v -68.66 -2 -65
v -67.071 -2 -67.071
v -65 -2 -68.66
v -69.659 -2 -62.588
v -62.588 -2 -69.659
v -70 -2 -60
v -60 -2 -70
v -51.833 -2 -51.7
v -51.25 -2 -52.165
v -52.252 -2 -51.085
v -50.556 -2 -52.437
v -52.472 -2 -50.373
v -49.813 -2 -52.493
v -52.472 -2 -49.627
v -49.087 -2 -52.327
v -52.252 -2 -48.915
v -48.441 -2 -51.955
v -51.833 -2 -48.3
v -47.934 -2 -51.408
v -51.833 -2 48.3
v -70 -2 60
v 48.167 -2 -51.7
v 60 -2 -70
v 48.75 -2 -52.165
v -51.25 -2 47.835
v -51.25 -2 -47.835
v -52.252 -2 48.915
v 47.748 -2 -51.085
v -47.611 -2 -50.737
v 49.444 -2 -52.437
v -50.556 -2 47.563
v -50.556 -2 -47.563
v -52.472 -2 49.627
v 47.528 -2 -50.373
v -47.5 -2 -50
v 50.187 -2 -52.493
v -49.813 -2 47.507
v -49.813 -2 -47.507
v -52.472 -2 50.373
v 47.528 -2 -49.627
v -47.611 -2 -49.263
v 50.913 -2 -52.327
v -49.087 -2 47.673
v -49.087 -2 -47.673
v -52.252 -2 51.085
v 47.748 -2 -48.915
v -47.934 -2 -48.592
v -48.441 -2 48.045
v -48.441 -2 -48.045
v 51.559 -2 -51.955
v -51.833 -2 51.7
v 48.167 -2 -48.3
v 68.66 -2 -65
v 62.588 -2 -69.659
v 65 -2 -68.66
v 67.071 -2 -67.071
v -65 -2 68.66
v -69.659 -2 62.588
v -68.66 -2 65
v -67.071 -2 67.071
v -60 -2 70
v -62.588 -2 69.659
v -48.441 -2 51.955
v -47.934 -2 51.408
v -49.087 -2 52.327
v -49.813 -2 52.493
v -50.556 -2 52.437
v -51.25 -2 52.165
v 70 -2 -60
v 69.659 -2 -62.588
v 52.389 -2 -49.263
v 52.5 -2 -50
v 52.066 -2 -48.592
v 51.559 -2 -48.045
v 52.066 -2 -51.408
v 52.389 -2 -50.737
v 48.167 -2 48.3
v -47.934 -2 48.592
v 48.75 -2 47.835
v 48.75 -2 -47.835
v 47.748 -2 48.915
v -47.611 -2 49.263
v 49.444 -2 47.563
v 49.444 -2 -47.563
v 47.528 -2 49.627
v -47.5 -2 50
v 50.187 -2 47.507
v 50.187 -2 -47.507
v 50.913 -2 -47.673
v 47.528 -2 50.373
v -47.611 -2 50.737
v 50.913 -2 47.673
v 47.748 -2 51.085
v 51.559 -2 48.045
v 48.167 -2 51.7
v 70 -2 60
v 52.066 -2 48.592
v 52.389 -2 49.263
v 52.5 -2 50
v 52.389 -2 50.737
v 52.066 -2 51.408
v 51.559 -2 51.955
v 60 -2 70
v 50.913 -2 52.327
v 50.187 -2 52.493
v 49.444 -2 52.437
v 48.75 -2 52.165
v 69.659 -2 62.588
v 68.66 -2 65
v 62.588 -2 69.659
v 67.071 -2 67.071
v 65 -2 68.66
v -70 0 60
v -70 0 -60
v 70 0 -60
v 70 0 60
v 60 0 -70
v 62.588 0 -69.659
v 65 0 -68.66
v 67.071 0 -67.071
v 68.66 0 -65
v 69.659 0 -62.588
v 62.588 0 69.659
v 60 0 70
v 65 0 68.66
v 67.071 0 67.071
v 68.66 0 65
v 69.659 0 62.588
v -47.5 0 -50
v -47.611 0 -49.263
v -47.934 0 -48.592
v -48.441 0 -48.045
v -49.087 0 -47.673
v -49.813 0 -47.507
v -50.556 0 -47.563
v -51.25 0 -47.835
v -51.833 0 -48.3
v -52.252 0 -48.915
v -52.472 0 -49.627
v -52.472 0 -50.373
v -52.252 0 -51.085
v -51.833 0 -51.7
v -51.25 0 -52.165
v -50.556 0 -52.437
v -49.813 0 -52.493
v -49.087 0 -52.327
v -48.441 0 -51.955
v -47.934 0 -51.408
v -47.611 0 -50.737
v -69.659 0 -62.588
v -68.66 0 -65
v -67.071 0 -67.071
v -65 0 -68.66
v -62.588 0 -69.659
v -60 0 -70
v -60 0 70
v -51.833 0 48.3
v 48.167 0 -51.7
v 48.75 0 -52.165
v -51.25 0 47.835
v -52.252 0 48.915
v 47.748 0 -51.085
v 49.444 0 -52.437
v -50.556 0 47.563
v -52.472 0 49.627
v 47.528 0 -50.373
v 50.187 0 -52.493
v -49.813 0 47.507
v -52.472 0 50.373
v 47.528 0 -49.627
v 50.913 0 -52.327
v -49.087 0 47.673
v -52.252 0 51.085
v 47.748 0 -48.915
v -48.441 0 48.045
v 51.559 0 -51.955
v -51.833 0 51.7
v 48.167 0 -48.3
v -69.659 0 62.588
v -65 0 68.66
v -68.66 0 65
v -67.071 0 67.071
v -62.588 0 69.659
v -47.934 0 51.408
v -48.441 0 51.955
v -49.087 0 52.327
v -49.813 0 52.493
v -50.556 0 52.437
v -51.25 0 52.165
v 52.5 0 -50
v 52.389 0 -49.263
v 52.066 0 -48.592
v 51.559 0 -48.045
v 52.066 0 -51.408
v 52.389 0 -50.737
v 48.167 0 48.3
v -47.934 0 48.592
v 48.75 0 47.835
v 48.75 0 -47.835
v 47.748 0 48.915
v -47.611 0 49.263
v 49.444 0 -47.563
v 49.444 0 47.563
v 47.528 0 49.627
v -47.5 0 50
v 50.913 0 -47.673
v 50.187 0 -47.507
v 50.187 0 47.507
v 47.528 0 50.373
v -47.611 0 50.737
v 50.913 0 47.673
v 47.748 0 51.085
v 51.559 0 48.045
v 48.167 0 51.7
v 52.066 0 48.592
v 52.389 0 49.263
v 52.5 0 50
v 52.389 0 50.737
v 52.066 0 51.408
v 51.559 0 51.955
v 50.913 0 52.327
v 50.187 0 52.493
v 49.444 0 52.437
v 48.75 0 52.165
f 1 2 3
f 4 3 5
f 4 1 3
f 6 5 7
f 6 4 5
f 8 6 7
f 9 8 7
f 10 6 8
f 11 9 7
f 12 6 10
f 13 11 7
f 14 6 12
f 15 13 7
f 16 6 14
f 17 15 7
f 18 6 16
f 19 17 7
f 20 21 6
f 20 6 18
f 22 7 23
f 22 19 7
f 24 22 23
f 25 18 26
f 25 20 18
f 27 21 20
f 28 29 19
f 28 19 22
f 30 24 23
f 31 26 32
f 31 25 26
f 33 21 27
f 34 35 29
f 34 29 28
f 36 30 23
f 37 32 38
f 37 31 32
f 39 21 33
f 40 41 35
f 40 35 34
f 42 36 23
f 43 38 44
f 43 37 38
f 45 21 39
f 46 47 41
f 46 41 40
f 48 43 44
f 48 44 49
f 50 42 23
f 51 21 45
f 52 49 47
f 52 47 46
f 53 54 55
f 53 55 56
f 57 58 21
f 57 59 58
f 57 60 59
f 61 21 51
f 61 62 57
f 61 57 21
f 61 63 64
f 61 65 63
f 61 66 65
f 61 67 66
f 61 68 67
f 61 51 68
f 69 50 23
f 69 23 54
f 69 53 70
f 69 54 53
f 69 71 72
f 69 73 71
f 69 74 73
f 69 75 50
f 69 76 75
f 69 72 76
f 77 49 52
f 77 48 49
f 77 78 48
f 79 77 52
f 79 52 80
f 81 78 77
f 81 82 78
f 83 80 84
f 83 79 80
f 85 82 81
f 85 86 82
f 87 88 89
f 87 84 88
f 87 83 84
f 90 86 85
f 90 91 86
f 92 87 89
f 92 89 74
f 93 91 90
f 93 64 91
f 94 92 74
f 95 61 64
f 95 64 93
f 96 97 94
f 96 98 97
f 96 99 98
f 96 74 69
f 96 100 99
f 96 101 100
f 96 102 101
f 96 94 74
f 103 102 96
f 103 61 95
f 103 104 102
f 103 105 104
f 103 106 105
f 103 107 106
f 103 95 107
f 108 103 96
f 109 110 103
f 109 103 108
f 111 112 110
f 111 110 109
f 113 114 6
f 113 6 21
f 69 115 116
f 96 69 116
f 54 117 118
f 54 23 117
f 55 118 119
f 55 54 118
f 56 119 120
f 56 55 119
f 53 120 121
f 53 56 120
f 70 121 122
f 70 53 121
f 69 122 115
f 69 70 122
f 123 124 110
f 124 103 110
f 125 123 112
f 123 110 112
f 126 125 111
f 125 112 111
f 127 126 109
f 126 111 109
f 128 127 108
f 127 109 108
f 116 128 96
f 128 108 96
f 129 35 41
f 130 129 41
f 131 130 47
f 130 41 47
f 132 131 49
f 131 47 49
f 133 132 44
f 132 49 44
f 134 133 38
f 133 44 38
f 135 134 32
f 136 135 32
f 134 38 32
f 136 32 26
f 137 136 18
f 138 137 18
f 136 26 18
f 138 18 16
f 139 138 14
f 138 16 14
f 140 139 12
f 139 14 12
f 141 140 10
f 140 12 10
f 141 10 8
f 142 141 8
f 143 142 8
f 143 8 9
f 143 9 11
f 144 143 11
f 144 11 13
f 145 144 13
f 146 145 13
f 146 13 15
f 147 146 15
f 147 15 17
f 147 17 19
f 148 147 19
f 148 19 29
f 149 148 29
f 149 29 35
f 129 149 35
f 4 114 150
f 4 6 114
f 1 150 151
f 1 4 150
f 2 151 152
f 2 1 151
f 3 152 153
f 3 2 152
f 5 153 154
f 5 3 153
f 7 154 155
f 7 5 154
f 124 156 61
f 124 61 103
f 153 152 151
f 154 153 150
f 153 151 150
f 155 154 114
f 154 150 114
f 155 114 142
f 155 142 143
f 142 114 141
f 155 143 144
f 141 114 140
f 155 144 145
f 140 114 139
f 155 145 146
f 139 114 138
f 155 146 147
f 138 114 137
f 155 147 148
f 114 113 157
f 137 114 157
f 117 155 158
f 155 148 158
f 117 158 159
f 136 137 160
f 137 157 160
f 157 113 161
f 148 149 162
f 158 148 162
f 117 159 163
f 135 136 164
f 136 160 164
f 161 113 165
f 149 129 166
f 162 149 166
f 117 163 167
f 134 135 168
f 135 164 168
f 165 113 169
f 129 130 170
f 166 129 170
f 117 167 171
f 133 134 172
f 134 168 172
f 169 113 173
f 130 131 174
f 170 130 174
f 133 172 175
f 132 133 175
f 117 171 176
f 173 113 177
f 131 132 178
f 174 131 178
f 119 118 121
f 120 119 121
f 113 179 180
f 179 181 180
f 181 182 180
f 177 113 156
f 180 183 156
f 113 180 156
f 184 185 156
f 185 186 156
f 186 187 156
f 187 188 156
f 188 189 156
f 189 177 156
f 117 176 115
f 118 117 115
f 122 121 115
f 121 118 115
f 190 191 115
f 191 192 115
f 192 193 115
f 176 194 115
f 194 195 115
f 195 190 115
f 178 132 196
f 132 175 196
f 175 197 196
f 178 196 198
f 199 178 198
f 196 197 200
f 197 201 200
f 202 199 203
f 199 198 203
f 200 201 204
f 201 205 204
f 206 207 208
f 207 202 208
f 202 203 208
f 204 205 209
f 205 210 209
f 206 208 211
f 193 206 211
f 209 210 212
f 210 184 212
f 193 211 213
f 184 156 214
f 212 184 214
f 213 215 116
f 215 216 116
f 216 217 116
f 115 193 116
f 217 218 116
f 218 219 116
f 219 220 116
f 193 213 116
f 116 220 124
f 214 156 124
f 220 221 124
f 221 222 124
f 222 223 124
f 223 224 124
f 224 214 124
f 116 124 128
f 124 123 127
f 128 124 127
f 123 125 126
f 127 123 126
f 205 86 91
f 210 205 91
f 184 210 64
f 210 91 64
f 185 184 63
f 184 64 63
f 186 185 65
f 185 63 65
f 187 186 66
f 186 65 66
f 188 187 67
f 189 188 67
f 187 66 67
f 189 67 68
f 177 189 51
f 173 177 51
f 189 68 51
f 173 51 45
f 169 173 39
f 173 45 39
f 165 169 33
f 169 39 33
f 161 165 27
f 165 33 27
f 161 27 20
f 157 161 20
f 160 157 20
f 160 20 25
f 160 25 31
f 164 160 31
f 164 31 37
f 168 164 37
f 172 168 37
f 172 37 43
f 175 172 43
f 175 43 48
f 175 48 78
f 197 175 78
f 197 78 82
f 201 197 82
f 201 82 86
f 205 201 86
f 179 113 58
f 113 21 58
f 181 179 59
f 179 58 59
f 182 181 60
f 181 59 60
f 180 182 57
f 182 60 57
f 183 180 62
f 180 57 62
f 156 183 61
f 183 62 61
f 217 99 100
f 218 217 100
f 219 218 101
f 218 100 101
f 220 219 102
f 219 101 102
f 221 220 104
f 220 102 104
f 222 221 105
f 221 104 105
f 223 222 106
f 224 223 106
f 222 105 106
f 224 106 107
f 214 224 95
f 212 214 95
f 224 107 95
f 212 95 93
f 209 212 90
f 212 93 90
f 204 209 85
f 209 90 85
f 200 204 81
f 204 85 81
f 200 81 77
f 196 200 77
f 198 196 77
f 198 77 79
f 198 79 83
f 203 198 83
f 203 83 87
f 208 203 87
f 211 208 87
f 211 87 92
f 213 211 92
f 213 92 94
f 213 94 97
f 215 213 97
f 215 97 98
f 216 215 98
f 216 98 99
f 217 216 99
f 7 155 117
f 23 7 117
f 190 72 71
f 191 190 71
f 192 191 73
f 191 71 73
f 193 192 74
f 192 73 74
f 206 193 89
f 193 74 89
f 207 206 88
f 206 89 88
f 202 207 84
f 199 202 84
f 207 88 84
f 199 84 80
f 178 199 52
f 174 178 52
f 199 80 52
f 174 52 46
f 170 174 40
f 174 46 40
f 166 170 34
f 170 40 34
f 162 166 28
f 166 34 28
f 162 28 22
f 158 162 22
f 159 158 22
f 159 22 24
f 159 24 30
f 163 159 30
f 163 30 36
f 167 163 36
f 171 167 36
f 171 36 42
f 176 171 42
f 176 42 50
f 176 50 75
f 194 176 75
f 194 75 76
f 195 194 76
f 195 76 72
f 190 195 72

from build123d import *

# Parameters (mm, degrees)
F0_W     = 140
F0_H     = 140
F1_DEPTH = 2
F2_R     = 2.5
F3_DEPTH = 25
F4_R     = 10


with BuildPart() as f1:
    # F0 (on Front) → F1 (new body)
    with BuildSketch(Plane.XZ):
        Rectangle(F0_W, F0_H)
    extrude(amount=F1_DEPTH)

    # F2 (on face) → F3 (cut)
    with BuildSketch(Plane.XZ.offset(2)):
        with Locations((-50, 50)):
            Circle(F2_R)
        with Locations((50, 50)):
            Circle(F2_R)
        with Locations((-50, -50)):
            Circle(F2_R)
        with Locations((50, -50)):
            Circle(F2_R)
    extrude(amount=-F3_DEPTH, mode=Mode.SUBTRACT)

    # F4
    f4_edges = [f1.edges().sort_by_distance(p)[0] for p in [
        (70, -1, 70),
        (70, -1, -70),
        (-70, -1, 70),
        (-70, -1, -70),
    ]]
    fillet(f4_edges, radius=F4_R)


solid = f1.part
